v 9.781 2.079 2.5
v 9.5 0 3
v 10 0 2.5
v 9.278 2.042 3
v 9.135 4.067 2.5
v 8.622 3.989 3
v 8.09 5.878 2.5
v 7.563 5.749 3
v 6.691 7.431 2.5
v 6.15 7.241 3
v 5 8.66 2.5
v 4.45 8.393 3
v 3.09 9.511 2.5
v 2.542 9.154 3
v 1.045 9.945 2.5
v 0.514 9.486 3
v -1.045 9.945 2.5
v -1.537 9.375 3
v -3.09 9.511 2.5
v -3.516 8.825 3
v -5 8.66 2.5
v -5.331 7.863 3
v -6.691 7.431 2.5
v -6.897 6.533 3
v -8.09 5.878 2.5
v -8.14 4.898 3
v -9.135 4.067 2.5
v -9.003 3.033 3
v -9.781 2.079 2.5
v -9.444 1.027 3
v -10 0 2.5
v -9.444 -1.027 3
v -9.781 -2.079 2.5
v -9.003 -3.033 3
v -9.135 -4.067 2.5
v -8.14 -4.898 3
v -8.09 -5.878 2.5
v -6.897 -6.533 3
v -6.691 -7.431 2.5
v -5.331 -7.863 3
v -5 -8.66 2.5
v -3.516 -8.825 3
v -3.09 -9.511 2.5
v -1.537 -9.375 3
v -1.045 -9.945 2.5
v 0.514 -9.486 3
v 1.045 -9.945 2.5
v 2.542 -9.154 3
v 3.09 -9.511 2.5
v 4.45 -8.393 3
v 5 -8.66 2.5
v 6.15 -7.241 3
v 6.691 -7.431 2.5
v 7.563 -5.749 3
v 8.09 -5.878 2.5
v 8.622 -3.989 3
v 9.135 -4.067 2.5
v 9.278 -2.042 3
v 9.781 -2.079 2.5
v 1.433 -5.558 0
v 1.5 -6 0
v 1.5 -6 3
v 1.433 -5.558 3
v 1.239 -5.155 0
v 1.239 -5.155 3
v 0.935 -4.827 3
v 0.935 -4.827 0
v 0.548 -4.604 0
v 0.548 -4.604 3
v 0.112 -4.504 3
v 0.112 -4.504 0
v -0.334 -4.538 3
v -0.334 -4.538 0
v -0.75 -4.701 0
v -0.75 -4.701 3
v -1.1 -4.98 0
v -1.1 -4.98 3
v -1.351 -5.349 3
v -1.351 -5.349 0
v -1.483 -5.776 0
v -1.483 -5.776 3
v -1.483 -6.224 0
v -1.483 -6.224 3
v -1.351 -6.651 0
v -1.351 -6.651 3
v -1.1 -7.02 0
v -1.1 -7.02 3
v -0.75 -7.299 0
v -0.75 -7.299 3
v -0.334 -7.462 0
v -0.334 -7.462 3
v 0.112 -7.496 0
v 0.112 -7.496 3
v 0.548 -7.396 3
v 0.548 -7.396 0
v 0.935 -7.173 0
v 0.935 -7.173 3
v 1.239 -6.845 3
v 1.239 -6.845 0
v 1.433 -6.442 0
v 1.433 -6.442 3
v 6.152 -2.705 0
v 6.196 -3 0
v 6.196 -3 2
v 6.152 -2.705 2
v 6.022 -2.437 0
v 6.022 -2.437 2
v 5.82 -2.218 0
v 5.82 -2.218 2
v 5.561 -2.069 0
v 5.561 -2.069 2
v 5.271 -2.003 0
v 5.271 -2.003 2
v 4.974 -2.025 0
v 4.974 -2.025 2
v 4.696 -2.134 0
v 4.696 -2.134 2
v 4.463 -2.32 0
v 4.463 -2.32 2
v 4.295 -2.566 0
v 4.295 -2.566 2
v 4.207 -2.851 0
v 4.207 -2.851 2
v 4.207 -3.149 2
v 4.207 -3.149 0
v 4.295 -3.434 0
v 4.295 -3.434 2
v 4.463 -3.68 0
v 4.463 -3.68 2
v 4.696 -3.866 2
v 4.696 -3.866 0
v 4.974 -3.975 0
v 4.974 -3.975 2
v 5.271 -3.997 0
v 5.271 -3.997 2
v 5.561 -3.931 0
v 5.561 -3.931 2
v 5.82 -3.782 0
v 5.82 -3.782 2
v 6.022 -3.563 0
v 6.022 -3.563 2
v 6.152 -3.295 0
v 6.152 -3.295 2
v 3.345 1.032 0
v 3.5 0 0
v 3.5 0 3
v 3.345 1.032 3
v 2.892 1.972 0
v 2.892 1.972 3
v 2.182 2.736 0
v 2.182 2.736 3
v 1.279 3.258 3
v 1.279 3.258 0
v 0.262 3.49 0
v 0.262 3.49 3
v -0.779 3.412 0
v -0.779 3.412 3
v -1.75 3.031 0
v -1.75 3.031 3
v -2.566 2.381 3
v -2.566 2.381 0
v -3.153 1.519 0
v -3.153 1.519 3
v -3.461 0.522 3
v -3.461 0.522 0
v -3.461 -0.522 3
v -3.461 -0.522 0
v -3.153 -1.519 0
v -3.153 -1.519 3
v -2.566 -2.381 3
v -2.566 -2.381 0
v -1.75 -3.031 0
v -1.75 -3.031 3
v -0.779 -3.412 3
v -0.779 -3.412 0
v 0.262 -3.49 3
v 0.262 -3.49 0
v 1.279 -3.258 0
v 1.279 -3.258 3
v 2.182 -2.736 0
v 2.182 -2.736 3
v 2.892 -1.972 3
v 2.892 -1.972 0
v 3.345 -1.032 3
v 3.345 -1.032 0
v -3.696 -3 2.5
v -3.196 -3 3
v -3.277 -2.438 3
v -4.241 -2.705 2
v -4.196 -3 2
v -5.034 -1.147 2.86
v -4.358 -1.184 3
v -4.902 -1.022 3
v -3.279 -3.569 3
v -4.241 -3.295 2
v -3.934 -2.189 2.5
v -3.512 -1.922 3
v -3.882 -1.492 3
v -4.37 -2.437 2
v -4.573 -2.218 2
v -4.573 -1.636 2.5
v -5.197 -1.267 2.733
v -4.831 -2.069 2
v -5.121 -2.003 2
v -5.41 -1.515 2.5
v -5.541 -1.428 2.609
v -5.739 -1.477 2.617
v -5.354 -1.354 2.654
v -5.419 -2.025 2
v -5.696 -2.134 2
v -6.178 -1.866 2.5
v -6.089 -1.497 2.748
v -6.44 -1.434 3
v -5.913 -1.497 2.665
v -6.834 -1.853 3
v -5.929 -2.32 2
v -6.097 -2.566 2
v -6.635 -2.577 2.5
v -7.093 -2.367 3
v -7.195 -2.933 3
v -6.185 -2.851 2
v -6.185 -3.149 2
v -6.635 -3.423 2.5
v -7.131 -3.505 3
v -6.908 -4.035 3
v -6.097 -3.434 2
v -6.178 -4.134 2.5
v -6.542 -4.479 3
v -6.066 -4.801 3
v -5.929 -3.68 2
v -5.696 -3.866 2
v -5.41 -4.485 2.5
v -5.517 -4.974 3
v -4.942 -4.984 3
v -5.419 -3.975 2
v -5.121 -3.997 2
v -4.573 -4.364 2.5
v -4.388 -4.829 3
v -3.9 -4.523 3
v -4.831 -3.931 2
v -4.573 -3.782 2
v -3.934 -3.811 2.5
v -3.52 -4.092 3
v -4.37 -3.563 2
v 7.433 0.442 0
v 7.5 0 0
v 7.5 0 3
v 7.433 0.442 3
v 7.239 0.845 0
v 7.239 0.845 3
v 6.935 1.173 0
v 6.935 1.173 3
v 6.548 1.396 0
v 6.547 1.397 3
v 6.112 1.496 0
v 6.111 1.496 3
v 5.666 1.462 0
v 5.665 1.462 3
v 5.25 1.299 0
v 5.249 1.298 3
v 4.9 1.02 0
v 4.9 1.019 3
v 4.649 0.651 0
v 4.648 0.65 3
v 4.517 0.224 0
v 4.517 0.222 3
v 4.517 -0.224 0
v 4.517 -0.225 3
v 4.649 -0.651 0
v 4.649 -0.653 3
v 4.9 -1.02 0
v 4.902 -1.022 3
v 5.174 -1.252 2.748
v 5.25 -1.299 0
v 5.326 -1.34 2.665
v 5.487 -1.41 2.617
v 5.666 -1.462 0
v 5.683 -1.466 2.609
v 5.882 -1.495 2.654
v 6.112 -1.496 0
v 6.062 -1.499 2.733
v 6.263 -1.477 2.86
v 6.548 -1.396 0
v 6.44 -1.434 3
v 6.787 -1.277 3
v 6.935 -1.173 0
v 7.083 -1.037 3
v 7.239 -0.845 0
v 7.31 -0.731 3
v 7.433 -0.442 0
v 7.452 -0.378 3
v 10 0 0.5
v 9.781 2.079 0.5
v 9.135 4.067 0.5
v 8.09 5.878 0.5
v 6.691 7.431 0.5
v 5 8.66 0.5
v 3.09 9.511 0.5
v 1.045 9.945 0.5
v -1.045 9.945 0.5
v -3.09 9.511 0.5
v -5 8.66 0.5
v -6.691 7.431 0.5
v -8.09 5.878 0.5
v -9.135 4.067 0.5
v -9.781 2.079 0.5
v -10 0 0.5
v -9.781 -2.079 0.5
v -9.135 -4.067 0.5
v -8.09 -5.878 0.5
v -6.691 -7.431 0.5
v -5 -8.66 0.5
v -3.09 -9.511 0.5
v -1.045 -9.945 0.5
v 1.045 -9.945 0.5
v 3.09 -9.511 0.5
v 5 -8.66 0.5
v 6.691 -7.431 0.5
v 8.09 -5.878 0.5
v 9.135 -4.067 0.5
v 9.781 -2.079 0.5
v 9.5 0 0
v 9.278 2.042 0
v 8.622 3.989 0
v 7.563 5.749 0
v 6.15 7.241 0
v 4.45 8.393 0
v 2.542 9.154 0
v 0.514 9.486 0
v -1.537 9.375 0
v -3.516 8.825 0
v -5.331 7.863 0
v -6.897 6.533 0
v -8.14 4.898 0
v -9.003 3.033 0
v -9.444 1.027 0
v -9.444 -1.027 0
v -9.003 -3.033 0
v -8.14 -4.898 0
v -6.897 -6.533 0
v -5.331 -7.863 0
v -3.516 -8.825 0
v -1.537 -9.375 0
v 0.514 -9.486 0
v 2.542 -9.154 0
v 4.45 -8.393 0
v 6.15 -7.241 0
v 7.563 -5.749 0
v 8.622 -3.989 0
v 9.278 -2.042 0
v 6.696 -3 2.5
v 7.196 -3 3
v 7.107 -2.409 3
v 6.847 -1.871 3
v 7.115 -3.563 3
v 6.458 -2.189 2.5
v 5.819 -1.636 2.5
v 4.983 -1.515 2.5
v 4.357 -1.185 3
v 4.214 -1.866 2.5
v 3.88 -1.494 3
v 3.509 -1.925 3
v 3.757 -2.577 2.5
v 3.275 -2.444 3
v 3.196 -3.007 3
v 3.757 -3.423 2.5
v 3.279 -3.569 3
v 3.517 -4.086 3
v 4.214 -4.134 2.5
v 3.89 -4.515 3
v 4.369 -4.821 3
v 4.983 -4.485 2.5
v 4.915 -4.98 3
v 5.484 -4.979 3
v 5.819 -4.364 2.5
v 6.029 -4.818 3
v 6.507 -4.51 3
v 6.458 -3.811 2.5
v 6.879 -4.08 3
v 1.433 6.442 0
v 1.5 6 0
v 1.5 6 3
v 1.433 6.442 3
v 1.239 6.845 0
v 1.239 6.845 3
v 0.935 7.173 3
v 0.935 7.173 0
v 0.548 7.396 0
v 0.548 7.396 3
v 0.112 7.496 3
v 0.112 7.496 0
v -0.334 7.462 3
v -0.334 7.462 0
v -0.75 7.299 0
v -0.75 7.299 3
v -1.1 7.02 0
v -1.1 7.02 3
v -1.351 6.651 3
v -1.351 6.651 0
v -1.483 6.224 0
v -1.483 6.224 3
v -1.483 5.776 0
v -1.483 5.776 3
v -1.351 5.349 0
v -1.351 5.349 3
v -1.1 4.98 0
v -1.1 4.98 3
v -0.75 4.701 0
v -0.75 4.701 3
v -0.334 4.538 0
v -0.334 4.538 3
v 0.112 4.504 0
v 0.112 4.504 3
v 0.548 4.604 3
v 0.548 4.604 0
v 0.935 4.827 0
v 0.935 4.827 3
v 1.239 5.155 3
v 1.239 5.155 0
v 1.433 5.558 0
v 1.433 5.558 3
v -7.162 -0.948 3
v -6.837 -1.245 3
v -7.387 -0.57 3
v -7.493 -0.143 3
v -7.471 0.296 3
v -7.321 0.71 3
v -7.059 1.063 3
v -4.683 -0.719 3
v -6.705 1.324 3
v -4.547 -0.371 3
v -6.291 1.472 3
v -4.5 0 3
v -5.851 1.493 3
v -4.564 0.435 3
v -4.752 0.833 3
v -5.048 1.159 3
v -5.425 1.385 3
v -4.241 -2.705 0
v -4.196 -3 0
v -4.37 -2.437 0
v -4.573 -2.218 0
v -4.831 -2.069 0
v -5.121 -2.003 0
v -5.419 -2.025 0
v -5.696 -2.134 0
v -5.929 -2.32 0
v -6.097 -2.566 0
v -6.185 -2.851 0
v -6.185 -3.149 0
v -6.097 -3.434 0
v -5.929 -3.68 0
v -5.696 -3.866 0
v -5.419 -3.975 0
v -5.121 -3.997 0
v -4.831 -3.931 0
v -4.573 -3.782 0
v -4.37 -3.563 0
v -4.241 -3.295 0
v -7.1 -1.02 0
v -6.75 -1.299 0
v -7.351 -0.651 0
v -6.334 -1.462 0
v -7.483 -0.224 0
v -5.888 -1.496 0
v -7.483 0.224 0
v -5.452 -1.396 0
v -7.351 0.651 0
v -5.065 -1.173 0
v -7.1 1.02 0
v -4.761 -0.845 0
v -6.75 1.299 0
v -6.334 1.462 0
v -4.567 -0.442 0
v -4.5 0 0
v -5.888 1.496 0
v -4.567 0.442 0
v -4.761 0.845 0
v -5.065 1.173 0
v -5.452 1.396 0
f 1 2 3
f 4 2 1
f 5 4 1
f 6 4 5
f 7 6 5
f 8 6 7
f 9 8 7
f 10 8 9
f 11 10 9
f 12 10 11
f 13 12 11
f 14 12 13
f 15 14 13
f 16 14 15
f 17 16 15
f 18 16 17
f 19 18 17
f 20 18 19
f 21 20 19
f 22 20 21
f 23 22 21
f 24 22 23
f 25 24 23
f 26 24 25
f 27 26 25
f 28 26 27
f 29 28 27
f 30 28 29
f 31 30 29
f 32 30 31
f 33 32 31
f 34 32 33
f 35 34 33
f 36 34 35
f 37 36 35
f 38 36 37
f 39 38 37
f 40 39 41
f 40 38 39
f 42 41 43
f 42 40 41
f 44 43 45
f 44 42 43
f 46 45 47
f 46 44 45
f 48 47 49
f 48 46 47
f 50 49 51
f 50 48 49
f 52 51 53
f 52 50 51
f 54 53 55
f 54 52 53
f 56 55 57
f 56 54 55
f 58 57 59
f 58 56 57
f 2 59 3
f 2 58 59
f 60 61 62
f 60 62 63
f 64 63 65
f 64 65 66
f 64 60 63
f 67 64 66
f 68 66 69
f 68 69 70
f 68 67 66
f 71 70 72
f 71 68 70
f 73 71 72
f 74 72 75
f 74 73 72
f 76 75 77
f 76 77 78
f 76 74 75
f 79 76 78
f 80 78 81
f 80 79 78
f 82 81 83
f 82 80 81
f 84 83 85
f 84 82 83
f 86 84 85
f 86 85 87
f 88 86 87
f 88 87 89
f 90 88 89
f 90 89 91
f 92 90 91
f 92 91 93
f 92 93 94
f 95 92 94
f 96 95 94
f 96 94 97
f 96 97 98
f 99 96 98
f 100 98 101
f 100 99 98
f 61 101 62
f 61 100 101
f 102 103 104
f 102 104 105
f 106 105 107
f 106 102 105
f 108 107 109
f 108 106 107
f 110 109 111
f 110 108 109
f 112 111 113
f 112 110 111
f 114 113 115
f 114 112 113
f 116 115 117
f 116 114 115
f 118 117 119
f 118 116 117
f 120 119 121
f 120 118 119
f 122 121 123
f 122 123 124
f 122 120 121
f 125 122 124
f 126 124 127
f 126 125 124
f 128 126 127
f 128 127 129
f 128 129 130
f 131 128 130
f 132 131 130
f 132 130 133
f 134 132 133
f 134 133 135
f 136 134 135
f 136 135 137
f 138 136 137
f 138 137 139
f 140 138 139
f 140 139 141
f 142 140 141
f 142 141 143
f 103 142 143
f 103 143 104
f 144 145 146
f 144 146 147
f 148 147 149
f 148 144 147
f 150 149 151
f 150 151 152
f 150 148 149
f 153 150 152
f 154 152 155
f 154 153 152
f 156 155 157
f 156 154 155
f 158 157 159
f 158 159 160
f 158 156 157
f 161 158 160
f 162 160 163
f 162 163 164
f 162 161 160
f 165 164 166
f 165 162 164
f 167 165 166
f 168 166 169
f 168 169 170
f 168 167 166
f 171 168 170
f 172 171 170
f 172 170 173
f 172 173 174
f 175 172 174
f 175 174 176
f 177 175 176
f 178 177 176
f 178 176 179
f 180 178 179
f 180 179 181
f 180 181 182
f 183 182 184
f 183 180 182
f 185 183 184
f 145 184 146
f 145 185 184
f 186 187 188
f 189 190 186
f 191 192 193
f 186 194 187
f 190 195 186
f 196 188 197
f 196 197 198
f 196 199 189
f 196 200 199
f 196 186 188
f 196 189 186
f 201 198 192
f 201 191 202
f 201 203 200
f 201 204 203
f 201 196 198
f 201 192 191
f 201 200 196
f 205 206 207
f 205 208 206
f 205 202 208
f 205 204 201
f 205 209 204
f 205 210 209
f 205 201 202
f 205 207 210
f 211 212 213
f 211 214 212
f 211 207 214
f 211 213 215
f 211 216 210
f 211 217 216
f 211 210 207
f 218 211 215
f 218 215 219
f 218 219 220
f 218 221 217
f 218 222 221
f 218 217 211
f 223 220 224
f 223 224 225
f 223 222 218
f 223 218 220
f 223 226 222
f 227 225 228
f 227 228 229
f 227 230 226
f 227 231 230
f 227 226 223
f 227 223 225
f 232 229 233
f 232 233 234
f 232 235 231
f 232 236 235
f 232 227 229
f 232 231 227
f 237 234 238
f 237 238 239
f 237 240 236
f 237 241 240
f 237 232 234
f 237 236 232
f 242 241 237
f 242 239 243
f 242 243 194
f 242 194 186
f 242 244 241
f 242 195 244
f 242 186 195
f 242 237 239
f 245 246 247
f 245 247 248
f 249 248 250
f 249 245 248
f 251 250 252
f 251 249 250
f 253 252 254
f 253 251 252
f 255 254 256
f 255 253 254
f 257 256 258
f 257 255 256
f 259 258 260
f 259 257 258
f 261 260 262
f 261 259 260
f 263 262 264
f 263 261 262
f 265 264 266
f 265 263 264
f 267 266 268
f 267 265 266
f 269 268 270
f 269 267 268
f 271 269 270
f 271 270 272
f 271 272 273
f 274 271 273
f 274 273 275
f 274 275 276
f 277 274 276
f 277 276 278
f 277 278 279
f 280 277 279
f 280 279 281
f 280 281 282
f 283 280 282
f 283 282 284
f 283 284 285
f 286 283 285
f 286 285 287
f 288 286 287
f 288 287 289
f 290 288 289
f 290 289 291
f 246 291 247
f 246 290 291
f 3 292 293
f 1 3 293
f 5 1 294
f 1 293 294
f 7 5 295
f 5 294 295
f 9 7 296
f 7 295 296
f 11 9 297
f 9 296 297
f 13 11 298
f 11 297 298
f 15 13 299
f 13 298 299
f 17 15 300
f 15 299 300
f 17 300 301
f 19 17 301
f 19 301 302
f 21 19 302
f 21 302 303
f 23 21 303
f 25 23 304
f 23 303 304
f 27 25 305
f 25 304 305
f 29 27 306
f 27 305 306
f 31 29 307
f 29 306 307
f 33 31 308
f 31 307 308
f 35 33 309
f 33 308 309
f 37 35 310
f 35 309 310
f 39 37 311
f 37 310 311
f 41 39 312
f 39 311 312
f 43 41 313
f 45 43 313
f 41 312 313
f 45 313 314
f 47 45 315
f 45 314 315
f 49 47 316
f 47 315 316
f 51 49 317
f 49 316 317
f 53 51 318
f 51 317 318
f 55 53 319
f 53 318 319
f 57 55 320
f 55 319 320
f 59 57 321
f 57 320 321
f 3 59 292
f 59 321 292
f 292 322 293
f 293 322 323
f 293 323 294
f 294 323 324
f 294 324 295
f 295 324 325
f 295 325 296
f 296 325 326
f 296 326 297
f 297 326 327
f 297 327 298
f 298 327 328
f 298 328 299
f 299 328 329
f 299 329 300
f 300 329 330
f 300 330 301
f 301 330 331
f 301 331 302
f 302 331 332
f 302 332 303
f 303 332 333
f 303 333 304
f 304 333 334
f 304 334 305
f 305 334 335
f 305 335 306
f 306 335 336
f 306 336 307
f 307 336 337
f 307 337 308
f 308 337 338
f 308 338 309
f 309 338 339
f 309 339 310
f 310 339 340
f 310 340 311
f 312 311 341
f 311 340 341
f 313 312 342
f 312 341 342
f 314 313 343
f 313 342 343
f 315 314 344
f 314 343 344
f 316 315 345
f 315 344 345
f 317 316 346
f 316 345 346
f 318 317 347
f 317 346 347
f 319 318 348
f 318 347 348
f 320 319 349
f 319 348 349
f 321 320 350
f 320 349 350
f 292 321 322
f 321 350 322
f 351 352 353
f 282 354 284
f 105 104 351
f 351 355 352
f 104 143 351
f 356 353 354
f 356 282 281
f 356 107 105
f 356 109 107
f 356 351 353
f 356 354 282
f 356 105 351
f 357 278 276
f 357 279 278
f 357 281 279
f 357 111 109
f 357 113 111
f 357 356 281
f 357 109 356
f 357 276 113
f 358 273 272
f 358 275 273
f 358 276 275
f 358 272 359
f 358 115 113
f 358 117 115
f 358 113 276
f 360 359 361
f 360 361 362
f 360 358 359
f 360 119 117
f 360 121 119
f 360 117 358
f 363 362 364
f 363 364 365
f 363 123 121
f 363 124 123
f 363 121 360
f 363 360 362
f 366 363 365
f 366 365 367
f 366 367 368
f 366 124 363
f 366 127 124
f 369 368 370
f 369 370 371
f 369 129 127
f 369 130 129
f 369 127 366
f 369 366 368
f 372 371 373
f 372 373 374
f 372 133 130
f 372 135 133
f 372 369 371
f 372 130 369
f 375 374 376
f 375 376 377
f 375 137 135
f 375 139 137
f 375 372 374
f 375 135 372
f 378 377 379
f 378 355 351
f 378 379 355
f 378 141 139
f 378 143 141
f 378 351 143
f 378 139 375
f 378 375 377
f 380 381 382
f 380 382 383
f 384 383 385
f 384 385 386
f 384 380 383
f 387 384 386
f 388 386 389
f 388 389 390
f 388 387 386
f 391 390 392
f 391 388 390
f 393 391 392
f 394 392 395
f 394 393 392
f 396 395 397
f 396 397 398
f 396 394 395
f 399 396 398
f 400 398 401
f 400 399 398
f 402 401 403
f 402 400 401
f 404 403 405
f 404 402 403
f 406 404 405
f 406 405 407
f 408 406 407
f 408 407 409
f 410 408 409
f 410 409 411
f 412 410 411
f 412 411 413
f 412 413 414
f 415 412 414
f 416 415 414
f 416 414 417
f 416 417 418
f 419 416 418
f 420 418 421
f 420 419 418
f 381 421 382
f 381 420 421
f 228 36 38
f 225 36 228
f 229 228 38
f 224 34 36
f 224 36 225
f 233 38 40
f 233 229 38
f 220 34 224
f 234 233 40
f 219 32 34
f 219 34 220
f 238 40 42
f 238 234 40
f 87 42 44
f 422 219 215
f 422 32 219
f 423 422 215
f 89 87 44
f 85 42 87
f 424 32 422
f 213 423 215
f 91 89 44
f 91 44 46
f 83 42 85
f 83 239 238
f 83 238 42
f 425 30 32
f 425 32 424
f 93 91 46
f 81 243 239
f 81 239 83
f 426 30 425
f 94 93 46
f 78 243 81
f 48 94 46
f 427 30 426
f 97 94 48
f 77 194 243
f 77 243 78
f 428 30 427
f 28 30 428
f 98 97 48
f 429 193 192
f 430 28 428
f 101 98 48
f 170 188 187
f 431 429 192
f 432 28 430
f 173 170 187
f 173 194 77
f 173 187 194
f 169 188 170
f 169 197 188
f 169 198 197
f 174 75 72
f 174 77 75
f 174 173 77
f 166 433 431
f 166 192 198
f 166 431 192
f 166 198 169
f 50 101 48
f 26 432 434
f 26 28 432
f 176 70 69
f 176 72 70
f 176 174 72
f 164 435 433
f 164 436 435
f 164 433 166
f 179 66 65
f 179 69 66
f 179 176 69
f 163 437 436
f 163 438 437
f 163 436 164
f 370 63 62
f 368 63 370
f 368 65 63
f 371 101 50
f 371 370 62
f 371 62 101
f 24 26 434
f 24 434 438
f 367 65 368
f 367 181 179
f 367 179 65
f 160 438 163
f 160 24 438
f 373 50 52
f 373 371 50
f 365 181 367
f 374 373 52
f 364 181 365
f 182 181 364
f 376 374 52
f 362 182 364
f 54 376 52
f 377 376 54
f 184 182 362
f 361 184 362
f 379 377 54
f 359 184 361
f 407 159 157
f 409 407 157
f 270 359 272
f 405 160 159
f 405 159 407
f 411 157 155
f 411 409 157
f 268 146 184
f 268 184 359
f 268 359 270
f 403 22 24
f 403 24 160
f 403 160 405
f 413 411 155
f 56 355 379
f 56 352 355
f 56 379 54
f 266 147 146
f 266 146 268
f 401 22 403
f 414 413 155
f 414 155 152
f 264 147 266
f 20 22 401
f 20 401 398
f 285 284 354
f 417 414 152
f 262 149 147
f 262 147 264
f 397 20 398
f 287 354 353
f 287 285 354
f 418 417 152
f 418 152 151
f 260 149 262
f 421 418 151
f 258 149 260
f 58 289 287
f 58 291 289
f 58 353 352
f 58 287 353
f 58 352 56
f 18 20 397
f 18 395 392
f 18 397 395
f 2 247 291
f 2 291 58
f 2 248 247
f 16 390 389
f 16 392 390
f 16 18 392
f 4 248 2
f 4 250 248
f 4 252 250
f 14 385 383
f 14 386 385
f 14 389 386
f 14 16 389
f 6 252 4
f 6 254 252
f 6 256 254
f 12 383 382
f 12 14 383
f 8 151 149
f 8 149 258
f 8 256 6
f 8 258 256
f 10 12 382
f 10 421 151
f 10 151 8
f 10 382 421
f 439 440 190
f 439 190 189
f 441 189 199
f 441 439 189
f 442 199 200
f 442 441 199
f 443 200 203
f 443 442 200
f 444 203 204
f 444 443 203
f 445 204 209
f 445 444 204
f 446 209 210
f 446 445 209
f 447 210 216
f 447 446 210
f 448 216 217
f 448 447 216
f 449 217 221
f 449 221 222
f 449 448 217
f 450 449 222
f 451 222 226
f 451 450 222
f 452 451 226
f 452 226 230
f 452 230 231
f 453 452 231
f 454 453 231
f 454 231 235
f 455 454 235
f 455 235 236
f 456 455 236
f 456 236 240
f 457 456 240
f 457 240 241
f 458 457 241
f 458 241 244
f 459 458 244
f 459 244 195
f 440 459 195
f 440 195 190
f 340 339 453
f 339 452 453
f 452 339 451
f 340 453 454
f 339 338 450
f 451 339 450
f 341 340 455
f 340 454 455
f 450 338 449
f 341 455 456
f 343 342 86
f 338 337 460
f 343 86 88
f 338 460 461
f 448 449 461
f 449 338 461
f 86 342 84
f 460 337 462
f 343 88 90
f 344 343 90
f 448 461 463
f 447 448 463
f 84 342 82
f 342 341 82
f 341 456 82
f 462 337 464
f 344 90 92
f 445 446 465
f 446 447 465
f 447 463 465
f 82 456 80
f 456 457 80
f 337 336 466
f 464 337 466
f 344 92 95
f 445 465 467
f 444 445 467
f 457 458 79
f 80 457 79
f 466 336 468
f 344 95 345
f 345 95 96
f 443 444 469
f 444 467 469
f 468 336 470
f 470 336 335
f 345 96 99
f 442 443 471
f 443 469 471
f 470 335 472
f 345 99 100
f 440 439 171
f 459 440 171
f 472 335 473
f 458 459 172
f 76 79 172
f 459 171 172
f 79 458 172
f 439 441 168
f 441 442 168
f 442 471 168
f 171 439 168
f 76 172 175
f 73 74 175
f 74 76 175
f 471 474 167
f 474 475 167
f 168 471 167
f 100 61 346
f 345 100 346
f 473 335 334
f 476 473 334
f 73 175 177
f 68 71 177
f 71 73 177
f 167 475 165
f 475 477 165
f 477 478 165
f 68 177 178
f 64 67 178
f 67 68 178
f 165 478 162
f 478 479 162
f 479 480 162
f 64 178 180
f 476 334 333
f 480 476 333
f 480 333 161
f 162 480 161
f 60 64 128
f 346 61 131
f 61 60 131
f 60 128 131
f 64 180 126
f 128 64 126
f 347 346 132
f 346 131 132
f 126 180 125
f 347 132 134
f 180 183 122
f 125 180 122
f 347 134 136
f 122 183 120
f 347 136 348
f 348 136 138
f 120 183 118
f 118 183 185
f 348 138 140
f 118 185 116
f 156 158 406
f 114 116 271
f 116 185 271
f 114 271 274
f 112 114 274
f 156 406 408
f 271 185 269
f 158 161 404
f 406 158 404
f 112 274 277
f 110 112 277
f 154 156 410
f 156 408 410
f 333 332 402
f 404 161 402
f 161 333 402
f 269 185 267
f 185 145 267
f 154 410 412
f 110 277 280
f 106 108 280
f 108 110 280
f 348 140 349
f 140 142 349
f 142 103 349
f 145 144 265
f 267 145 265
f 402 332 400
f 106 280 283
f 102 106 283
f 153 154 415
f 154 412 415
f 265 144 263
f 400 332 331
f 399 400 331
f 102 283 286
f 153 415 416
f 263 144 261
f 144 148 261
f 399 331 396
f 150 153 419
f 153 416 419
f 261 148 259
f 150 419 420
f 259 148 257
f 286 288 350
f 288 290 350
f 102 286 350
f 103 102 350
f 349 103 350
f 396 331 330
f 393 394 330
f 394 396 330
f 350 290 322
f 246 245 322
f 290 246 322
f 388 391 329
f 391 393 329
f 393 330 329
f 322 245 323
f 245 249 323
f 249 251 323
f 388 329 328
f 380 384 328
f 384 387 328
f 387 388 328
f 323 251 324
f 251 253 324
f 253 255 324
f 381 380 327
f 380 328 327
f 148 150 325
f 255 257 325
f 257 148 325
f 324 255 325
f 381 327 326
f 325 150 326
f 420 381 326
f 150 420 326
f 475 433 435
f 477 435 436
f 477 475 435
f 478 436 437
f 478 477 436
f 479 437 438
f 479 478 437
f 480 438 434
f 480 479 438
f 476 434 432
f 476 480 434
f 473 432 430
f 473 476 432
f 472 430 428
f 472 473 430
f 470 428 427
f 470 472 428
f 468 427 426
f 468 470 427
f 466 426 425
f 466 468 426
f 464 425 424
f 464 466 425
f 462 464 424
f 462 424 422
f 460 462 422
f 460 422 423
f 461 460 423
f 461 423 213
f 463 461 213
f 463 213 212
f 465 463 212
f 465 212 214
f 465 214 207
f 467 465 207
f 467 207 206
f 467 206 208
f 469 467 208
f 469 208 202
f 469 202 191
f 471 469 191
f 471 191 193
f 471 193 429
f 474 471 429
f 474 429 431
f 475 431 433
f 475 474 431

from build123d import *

# Parameters (mm, degrees)
SKETCH_1_R      = 10
SKETCH_1_R_2    = 1.5
SKETCH_1_R_3    = 3.5
SKETCH_1_R_4    = 1
EXTRUDE_1_DEPTH = 3
CHAMFER_1_SIZE  = 0.5
CHAMFER_2_SIZE  = 1


with BuildPart() as part:
    # 草图1 → 凸台-拉伸1 (new body)
    with BuildSketch(Plane.XY):
        Circle(SKETCH_1_R)
        with Locations((-6, 0)):
            Circle(SKETCH_1_R_2, mode=Mode.SUBTRACT)
        with Locations((0, -6)):
            Circle(SKETCH_1_R_2, mode=Mode.SUBTRACT)
        with Locations((6, 0)):
            Circle(SKETCH_1_R_2, mode=Mode.SUBTRACT)
        Circle(SKETCH_1_R_3, mode=Mode.SUBTRACT)
        with Locations((0, 6)):
            Circle(SKETCH_1_R_2, mode=Mode.SUBTRACT)
        with Locations((5.196152423, -3)):
            Circle(SKETCH_1_R_4, mode=Mode.SUBTRACT)
        with Locations((-5.196152423, -3)):
            Circle(SKETCH_1_R_4, mode=Mode.SUBTRACT)
    extrude(amount=EXTRUDE_1_DEPTH)

    # 倒角1
    chamfer_1_edges = [part.edges().sort_by_distance(p)[0] for p in [
        (-10, 0, 0),
        (-10, 0, 3),
    ]]
    chamfer(chamfer_1_edges, length=CHAMFER_1_SIZE)

    # 倒角2
    # the kernel refuses this chamfer: 1 mm, written as the material it takes off along each edge
    with BuildSketch(Plane(origin=(5.196152423, -3, 3), x_dir=(1, 0, 0), z_dir=(0, -1, 0))) as chamfer_2_piece_1:
        Polygon((1 + CHAMFER_2_SIZE, 0), (1, -CHAMFER_2_SIZE), (1, 0), align=None)
    revolve(axis=Axis((5.196152423, -3, 3), (0, 0, 1)), mode=Mode.SUBTRACT)
    with BuildSketch(Plane(origin=(-5.196152423, -3, 3), x_dir=(1, 0, 0), z_dir=(0, -1, 0))) as chamfer_2_piece_2:
        Polygon((1 + CHAMFER_2_SIZE, 0), (1, -CHAMFER_2_SIZE), (1, 0), align=None)
    revolve(axis=Axis((-5.196152423, -3, 3), (0, 0, 1)), mode=Mode.SUBTRACT)


solid = part.part
